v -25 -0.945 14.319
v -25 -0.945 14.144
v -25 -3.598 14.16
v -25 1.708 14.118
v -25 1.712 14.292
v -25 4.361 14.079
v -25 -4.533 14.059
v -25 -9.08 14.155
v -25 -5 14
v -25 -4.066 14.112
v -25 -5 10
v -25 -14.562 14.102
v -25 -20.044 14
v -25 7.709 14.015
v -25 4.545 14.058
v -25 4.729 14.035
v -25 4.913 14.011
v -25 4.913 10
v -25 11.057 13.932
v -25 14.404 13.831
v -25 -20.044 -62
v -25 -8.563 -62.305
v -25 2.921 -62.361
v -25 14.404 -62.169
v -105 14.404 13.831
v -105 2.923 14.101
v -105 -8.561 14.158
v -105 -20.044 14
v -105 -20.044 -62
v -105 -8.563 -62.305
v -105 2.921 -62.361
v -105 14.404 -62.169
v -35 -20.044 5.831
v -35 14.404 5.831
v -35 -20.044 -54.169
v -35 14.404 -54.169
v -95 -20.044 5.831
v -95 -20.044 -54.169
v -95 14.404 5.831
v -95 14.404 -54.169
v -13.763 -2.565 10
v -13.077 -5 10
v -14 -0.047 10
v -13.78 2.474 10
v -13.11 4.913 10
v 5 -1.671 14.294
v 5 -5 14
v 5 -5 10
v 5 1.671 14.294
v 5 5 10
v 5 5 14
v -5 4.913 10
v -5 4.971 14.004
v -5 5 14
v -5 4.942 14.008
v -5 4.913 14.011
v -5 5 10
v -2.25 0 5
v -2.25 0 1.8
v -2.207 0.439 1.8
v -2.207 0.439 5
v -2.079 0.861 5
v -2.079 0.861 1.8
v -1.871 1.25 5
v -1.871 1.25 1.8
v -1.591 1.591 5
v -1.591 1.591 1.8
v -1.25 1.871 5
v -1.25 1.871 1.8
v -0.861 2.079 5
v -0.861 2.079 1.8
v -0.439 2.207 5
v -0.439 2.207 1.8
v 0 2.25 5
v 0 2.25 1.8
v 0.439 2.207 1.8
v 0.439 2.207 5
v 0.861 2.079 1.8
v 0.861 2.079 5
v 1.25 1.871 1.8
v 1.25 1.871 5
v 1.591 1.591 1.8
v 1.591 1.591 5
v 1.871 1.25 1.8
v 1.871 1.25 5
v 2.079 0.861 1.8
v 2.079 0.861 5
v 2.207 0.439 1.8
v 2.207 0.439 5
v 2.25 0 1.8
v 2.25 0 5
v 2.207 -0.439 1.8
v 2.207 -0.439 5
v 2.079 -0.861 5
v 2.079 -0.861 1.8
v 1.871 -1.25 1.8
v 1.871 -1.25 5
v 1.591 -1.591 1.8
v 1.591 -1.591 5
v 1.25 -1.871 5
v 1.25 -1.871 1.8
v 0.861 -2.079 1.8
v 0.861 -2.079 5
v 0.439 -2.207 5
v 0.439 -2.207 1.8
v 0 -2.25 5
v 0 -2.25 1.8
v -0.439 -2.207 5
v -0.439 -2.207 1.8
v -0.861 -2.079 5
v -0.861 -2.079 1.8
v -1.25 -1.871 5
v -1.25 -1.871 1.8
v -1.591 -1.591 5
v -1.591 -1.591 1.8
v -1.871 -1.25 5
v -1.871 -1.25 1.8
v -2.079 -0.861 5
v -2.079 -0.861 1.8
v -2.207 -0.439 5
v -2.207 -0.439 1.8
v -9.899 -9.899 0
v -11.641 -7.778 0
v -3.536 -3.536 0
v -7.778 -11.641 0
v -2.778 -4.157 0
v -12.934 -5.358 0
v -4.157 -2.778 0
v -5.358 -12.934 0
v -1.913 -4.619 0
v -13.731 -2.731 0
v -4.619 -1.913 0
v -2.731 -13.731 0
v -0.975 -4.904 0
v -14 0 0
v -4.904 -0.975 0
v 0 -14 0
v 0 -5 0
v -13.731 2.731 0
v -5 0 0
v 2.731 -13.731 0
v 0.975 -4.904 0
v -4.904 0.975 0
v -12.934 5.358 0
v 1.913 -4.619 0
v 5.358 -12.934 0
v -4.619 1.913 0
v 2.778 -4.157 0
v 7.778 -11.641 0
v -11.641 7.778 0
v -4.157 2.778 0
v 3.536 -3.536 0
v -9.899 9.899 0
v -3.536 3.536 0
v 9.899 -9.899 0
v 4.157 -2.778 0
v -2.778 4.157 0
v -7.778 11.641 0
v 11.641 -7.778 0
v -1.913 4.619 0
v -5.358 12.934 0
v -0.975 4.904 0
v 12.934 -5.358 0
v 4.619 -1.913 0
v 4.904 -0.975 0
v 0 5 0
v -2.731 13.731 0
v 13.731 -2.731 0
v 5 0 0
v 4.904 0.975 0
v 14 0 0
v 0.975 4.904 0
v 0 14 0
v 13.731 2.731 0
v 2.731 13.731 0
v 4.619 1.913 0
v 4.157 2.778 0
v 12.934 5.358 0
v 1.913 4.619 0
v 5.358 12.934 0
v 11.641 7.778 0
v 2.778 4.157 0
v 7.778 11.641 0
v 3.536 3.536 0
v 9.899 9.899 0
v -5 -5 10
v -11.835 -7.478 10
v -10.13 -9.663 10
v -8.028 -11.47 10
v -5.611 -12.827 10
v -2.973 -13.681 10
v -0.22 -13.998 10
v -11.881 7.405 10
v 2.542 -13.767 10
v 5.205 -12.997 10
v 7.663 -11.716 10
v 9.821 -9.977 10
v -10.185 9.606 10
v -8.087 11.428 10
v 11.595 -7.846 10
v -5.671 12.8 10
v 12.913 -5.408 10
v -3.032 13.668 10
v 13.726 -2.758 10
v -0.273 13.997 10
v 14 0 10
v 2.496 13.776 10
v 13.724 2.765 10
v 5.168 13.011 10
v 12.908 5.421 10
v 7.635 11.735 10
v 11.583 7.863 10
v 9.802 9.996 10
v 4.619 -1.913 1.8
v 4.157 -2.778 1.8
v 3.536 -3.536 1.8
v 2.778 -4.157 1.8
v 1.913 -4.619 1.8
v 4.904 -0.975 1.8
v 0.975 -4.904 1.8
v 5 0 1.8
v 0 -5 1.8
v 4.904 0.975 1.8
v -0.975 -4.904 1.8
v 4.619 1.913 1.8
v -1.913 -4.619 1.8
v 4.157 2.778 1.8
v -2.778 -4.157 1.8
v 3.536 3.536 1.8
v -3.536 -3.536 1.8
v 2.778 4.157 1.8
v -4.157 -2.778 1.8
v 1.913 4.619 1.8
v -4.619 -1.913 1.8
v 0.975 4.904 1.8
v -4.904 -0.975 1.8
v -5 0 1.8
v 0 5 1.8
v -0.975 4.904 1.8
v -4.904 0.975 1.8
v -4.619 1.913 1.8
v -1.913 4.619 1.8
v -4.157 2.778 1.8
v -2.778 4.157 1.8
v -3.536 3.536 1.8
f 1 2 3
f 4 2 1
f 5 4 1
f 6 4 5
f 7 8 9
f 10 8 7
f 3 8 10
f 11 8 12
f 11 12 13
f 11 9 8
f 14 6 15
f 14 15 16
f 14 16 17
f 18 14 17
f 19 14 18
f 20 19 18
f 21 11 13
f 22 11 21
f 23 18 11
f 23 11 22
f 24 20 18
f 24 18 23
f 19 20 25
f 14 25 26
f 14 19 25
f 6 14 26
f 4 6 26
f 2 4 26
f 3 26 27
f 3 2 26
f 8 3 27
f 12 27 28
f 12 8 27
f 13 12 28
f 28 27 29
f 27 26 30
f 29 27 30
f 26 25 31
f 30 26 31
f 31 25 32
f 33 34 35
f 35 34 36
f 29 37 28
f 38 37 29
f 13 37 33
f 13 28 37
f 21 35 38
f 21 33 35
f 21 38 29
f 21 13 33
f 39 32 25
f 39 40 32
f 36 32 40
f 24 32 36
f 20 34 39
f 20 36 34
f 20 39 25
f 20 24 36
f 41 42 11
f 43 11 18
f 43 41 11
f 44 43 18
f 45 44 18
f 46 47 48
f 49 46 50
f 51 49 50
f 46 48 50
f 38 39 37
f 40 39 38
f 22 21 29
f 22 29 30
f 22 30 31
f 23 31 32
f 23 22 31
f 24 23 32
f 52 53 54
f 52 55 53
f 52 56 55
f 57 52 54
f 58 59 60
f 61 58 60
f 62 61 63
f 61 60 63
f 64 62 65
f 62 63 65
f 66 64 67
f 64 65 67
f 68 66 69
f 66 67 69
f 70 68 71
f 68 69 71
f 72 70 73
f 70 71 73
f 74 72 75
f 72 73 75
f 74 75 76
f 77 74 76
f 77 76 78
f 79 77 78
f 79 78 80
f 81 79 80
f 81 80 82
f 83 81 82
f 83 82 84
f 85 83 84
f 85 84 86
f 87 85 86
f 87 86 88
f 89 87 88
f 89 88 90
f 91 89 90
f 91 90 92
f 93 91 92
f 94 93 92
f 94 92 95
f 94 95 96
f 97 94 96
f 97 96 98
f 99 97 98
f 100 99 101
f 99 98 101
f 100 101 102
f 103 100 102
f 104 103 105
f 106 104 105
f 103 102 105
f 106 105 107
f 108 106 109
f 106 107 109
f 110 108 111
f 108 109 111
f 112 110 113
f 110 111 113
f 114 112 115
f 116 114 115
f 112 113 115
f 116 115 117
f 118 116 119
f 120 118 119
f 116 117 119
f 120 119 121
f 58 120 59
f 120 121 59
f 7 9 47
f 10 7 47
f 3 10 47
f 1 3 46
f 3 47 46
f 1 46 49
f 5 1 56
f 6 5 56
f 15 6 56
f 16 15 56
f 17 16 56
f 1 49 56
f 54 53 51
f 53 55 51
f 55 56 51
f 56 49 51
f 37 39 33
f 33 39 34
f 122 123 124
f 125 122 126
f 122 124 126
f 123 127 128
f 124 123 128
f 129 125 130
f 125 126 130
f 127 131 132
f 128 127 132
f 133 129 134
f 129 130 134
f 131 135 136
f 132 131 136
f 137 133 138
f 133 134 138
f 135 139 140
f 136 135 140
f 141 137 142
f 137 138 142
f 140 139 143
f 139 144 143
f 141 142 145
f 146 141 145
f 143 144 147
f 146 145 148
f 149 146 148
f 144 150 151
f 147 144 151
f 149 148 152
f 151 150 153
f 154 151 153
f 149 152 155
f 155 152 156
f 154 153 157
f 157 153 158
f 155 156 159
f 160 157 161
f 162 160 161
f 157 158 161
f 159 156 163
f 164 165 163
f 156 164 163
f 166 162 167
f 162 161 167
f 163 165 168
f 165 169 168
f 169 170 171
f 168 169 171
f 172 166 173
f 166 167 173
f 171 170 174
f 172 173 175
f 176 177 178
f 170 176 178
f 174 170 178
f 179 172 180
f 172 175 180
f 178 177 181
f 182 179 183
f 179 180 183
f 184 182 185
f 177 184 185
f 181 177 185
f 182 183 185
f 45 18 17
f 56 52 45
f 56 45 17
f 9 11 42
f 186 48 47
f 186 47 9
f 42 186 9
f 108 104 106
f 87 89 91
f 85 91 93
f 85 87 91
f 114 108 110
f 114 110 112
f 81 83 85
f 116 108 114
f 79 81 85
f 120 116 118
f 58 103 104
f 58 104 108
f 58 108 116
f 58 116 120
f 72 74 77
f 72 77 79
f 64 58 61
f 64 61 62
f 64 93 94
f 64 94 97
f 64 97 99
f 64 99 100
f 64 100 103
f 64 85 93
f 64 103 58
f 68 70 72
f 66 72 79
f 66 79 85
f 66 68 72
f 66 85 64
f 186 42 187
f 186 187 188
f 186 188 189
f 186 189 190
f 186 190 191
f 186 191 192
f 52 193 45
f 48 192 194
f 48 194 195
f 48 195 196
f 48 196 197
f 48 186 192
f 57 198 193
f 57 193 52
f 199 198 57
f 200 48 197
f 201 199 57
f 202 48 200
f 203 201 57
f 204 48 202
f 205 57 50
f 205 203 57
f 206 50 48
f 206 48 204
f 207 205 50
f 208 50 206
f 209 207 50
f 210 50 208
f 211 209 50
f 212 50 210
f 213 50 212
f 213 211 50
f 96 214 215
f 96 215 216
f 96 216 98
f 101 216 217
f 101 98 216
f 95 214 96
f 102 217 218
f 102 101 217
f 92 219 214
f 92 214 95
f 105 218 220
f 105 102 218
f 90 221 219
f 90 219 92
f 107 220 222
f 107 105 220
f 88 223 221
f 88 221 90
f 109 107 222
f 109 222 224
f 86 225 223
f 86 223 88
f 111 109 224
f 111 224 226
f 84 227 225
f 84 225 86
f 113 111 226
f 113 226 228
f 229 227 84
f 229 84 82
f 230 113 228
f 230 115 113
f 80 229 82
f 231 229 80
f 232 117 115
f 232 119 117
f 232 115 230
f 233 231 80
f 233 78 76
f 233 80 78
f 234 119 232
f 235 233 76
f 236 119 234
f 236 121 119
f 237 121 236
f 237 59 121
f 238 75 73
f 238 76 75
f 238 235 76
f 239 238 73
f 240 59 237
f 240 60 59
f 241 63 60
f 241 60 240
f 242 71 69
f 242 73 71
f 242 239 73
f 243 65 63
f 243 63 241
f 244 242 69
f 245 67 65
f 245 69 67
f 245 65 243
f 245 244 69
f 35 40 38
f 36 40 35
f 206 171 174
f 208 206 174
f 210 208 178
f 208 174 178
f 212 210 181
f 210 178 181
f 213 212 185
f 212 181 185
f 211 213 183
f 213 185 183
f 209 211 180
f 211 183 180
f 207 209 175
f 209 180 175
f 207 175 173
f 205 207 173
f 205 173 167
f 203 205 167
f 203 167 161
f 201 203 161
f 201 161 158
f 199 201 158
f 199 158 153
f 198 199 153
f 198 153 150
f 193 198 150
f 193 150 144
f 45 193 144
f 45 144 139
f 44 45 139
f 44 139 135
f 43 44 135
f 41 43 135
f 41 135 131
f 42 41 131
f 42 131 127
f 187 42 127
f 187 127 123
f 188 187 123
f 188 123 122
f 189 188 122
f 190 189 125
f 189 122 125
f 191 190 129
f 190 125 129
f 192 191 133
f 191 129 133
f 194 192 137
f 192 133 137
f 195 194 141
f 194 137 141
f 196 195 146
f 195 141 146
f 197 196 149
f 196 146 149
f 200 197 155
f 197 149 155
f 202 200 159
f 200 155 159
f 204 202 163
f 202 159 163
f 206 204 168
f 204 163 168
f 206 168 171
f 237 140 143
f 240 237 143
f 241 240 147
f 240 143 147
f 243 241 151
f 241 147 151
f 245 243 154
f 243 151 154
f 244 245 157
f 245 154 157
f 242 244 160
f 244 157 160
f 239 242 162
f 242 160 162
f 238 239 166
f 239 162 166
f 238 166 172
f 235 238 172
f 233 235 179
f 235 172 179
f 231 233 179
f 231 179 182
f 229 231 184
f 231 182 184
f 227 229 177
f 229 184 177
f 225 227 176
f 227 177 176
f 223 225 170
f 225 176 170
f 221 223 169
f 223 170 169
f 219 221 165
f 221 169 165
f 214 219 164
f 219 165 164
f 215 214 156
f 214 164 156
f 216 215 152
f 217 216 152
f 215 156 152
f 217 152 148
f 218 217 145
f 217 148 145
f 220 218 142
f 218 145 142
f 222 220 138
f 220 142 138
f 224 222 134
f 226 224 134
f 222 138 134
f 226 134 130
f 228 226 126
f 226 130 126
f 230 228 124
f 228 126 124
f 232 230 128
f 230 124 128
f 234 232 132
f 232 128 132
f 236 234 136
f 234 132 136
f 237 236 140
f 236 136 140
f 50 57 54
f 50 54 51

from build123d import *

# Parameters (mm, degrees)
SKETCH1_R           = 14
BOSS_EXTRUDE1_DEPTH = 10
SKETCH2_R           = 2.25
CUT_EXTRUDE1_DEPTH  = 5
SKETCH3_R           = 5
CUT_EXTRUDE2_DEPTH  = 1.8
SKETCH4_W           = 10
SKETCH4_H           = 10
BOSS_EXTRUDE2_DEPTH = 8
SKETCH6_W           = 8
SKETCH6_H           = 9.912865289
BOSS_EXTRUDE3_DEPTH = 20
CUT_EXTRUDE3_DEPTH  = 30
BOSS_EXTRUDE4_DEPTH = 80
SKETCH9_W           = 60
SKETCH9_H           = 60
CUT_EXTRUDE4_DEPTH  = 100


with BuildPart() as part:
    # Sketch1 → Boss-Extrude1 (new body)
    with BuildSketch(Plane.XY):
        Circle(SKETCH1_R)
    extrude(amount=BOSS_EXTRUDE1_DEPTH)

    # Sketch2 → Cut-Extrude1 (cut)
    with BuildSketch(Plane(origin=(0, 0, 0), x_dir=(-1, 0, 0), z_dir=(0, 0, -1))):
        Circle(SKETCH2_R)
    extrude(amount=-CUT_EXTRUDE1_DEPTH, mode=Mode.SUBTRACT)

    # Sketch3 → Cut-Extrude2 (cut)
    with BuildSketch(Plane(origin=(0, 0, 0), x_dir=(-1, 0, 0), z_dir=(0, 0, -1))):
        Circle(SKETCH3_R)
    extrude(amount=-CUT_EXTRUDE2_DEPTH, mode=Mode.SUBTRACT)

    # Sketch4 → Boss-Extrude2 (add)
    with BuildSketch(Plane.XY.offset(10)):
        Rectangle(SKETCH4_W, SKETCH4_H)
    extrude(amount=BOSS_EXTRUDE2_DEPTH)

    # Sketch6 → Boss-Extrude3 (add)
    with BuildSketch(Plane.ZY.offset(5)):
        with Locations((14, -0.043567356)):
            Rectangle(SKETCH6_W, SKETCH6_H)
    extrude(amount=BOSS_EXTRUDE3_DEPTH)

    # Sketch7 → Cut-Extrude3 (cut)
    with BuildSketch(Plane(origin=(5, 0, 0), x_dir=(0, 0, -1), z_dir=(1, 0, 0))):
        with BuildLine():
            Line((-18, 5), (-18, -5))
            Line((-18, -5), (-14, -5))
            ThreePointArc((-14, -5), (-14.330383596, 0), (-14, 5))
            Line((-14, 5), (-18, 5))
        make_face()
    extrude(amount=-CUT_EXTRUDE3_DEPTH, mode=Mode.SUBTRACT)

    # Sketch8 → Boss-Extrude4 (add)
    with BuildSketch(Plane.ZY.offset(25)):
        with BuildLine():
            Line((-62.16885098, 14.403585903), (13.83114902, 14.403585903))
            ThreePointArc((13.83114902, 14.403585903), (14.156322075, -2.818810644), (14, -20.043567356))
            Line((14, -20.043567356), (-62, -20.043567356))
            ThreePointArc((-62, -20.043567356), (-62.363996537, -2.821361111), (-62.16885098, 14.403585903))
        make_face()
    extrude(amount=BOSS_EXTRUDE4_DEPTH)

    # Sketch9 → Cut-Extrude4 (cut)
    with BuildSketch(Plane(origin=(0, 14.403585903, 0), x_dir=(1, 0, 0), z_dir=(0, 1, 0))):
        with Locations((-65, 24.16885098)):
            Rectangle(SKETCH9_W, SKETCH9_H)
    extrude(amount=-CUT_EXTRUDE4_DEPTH, mode=Mode.SUBTRACT)


solid = part.part
